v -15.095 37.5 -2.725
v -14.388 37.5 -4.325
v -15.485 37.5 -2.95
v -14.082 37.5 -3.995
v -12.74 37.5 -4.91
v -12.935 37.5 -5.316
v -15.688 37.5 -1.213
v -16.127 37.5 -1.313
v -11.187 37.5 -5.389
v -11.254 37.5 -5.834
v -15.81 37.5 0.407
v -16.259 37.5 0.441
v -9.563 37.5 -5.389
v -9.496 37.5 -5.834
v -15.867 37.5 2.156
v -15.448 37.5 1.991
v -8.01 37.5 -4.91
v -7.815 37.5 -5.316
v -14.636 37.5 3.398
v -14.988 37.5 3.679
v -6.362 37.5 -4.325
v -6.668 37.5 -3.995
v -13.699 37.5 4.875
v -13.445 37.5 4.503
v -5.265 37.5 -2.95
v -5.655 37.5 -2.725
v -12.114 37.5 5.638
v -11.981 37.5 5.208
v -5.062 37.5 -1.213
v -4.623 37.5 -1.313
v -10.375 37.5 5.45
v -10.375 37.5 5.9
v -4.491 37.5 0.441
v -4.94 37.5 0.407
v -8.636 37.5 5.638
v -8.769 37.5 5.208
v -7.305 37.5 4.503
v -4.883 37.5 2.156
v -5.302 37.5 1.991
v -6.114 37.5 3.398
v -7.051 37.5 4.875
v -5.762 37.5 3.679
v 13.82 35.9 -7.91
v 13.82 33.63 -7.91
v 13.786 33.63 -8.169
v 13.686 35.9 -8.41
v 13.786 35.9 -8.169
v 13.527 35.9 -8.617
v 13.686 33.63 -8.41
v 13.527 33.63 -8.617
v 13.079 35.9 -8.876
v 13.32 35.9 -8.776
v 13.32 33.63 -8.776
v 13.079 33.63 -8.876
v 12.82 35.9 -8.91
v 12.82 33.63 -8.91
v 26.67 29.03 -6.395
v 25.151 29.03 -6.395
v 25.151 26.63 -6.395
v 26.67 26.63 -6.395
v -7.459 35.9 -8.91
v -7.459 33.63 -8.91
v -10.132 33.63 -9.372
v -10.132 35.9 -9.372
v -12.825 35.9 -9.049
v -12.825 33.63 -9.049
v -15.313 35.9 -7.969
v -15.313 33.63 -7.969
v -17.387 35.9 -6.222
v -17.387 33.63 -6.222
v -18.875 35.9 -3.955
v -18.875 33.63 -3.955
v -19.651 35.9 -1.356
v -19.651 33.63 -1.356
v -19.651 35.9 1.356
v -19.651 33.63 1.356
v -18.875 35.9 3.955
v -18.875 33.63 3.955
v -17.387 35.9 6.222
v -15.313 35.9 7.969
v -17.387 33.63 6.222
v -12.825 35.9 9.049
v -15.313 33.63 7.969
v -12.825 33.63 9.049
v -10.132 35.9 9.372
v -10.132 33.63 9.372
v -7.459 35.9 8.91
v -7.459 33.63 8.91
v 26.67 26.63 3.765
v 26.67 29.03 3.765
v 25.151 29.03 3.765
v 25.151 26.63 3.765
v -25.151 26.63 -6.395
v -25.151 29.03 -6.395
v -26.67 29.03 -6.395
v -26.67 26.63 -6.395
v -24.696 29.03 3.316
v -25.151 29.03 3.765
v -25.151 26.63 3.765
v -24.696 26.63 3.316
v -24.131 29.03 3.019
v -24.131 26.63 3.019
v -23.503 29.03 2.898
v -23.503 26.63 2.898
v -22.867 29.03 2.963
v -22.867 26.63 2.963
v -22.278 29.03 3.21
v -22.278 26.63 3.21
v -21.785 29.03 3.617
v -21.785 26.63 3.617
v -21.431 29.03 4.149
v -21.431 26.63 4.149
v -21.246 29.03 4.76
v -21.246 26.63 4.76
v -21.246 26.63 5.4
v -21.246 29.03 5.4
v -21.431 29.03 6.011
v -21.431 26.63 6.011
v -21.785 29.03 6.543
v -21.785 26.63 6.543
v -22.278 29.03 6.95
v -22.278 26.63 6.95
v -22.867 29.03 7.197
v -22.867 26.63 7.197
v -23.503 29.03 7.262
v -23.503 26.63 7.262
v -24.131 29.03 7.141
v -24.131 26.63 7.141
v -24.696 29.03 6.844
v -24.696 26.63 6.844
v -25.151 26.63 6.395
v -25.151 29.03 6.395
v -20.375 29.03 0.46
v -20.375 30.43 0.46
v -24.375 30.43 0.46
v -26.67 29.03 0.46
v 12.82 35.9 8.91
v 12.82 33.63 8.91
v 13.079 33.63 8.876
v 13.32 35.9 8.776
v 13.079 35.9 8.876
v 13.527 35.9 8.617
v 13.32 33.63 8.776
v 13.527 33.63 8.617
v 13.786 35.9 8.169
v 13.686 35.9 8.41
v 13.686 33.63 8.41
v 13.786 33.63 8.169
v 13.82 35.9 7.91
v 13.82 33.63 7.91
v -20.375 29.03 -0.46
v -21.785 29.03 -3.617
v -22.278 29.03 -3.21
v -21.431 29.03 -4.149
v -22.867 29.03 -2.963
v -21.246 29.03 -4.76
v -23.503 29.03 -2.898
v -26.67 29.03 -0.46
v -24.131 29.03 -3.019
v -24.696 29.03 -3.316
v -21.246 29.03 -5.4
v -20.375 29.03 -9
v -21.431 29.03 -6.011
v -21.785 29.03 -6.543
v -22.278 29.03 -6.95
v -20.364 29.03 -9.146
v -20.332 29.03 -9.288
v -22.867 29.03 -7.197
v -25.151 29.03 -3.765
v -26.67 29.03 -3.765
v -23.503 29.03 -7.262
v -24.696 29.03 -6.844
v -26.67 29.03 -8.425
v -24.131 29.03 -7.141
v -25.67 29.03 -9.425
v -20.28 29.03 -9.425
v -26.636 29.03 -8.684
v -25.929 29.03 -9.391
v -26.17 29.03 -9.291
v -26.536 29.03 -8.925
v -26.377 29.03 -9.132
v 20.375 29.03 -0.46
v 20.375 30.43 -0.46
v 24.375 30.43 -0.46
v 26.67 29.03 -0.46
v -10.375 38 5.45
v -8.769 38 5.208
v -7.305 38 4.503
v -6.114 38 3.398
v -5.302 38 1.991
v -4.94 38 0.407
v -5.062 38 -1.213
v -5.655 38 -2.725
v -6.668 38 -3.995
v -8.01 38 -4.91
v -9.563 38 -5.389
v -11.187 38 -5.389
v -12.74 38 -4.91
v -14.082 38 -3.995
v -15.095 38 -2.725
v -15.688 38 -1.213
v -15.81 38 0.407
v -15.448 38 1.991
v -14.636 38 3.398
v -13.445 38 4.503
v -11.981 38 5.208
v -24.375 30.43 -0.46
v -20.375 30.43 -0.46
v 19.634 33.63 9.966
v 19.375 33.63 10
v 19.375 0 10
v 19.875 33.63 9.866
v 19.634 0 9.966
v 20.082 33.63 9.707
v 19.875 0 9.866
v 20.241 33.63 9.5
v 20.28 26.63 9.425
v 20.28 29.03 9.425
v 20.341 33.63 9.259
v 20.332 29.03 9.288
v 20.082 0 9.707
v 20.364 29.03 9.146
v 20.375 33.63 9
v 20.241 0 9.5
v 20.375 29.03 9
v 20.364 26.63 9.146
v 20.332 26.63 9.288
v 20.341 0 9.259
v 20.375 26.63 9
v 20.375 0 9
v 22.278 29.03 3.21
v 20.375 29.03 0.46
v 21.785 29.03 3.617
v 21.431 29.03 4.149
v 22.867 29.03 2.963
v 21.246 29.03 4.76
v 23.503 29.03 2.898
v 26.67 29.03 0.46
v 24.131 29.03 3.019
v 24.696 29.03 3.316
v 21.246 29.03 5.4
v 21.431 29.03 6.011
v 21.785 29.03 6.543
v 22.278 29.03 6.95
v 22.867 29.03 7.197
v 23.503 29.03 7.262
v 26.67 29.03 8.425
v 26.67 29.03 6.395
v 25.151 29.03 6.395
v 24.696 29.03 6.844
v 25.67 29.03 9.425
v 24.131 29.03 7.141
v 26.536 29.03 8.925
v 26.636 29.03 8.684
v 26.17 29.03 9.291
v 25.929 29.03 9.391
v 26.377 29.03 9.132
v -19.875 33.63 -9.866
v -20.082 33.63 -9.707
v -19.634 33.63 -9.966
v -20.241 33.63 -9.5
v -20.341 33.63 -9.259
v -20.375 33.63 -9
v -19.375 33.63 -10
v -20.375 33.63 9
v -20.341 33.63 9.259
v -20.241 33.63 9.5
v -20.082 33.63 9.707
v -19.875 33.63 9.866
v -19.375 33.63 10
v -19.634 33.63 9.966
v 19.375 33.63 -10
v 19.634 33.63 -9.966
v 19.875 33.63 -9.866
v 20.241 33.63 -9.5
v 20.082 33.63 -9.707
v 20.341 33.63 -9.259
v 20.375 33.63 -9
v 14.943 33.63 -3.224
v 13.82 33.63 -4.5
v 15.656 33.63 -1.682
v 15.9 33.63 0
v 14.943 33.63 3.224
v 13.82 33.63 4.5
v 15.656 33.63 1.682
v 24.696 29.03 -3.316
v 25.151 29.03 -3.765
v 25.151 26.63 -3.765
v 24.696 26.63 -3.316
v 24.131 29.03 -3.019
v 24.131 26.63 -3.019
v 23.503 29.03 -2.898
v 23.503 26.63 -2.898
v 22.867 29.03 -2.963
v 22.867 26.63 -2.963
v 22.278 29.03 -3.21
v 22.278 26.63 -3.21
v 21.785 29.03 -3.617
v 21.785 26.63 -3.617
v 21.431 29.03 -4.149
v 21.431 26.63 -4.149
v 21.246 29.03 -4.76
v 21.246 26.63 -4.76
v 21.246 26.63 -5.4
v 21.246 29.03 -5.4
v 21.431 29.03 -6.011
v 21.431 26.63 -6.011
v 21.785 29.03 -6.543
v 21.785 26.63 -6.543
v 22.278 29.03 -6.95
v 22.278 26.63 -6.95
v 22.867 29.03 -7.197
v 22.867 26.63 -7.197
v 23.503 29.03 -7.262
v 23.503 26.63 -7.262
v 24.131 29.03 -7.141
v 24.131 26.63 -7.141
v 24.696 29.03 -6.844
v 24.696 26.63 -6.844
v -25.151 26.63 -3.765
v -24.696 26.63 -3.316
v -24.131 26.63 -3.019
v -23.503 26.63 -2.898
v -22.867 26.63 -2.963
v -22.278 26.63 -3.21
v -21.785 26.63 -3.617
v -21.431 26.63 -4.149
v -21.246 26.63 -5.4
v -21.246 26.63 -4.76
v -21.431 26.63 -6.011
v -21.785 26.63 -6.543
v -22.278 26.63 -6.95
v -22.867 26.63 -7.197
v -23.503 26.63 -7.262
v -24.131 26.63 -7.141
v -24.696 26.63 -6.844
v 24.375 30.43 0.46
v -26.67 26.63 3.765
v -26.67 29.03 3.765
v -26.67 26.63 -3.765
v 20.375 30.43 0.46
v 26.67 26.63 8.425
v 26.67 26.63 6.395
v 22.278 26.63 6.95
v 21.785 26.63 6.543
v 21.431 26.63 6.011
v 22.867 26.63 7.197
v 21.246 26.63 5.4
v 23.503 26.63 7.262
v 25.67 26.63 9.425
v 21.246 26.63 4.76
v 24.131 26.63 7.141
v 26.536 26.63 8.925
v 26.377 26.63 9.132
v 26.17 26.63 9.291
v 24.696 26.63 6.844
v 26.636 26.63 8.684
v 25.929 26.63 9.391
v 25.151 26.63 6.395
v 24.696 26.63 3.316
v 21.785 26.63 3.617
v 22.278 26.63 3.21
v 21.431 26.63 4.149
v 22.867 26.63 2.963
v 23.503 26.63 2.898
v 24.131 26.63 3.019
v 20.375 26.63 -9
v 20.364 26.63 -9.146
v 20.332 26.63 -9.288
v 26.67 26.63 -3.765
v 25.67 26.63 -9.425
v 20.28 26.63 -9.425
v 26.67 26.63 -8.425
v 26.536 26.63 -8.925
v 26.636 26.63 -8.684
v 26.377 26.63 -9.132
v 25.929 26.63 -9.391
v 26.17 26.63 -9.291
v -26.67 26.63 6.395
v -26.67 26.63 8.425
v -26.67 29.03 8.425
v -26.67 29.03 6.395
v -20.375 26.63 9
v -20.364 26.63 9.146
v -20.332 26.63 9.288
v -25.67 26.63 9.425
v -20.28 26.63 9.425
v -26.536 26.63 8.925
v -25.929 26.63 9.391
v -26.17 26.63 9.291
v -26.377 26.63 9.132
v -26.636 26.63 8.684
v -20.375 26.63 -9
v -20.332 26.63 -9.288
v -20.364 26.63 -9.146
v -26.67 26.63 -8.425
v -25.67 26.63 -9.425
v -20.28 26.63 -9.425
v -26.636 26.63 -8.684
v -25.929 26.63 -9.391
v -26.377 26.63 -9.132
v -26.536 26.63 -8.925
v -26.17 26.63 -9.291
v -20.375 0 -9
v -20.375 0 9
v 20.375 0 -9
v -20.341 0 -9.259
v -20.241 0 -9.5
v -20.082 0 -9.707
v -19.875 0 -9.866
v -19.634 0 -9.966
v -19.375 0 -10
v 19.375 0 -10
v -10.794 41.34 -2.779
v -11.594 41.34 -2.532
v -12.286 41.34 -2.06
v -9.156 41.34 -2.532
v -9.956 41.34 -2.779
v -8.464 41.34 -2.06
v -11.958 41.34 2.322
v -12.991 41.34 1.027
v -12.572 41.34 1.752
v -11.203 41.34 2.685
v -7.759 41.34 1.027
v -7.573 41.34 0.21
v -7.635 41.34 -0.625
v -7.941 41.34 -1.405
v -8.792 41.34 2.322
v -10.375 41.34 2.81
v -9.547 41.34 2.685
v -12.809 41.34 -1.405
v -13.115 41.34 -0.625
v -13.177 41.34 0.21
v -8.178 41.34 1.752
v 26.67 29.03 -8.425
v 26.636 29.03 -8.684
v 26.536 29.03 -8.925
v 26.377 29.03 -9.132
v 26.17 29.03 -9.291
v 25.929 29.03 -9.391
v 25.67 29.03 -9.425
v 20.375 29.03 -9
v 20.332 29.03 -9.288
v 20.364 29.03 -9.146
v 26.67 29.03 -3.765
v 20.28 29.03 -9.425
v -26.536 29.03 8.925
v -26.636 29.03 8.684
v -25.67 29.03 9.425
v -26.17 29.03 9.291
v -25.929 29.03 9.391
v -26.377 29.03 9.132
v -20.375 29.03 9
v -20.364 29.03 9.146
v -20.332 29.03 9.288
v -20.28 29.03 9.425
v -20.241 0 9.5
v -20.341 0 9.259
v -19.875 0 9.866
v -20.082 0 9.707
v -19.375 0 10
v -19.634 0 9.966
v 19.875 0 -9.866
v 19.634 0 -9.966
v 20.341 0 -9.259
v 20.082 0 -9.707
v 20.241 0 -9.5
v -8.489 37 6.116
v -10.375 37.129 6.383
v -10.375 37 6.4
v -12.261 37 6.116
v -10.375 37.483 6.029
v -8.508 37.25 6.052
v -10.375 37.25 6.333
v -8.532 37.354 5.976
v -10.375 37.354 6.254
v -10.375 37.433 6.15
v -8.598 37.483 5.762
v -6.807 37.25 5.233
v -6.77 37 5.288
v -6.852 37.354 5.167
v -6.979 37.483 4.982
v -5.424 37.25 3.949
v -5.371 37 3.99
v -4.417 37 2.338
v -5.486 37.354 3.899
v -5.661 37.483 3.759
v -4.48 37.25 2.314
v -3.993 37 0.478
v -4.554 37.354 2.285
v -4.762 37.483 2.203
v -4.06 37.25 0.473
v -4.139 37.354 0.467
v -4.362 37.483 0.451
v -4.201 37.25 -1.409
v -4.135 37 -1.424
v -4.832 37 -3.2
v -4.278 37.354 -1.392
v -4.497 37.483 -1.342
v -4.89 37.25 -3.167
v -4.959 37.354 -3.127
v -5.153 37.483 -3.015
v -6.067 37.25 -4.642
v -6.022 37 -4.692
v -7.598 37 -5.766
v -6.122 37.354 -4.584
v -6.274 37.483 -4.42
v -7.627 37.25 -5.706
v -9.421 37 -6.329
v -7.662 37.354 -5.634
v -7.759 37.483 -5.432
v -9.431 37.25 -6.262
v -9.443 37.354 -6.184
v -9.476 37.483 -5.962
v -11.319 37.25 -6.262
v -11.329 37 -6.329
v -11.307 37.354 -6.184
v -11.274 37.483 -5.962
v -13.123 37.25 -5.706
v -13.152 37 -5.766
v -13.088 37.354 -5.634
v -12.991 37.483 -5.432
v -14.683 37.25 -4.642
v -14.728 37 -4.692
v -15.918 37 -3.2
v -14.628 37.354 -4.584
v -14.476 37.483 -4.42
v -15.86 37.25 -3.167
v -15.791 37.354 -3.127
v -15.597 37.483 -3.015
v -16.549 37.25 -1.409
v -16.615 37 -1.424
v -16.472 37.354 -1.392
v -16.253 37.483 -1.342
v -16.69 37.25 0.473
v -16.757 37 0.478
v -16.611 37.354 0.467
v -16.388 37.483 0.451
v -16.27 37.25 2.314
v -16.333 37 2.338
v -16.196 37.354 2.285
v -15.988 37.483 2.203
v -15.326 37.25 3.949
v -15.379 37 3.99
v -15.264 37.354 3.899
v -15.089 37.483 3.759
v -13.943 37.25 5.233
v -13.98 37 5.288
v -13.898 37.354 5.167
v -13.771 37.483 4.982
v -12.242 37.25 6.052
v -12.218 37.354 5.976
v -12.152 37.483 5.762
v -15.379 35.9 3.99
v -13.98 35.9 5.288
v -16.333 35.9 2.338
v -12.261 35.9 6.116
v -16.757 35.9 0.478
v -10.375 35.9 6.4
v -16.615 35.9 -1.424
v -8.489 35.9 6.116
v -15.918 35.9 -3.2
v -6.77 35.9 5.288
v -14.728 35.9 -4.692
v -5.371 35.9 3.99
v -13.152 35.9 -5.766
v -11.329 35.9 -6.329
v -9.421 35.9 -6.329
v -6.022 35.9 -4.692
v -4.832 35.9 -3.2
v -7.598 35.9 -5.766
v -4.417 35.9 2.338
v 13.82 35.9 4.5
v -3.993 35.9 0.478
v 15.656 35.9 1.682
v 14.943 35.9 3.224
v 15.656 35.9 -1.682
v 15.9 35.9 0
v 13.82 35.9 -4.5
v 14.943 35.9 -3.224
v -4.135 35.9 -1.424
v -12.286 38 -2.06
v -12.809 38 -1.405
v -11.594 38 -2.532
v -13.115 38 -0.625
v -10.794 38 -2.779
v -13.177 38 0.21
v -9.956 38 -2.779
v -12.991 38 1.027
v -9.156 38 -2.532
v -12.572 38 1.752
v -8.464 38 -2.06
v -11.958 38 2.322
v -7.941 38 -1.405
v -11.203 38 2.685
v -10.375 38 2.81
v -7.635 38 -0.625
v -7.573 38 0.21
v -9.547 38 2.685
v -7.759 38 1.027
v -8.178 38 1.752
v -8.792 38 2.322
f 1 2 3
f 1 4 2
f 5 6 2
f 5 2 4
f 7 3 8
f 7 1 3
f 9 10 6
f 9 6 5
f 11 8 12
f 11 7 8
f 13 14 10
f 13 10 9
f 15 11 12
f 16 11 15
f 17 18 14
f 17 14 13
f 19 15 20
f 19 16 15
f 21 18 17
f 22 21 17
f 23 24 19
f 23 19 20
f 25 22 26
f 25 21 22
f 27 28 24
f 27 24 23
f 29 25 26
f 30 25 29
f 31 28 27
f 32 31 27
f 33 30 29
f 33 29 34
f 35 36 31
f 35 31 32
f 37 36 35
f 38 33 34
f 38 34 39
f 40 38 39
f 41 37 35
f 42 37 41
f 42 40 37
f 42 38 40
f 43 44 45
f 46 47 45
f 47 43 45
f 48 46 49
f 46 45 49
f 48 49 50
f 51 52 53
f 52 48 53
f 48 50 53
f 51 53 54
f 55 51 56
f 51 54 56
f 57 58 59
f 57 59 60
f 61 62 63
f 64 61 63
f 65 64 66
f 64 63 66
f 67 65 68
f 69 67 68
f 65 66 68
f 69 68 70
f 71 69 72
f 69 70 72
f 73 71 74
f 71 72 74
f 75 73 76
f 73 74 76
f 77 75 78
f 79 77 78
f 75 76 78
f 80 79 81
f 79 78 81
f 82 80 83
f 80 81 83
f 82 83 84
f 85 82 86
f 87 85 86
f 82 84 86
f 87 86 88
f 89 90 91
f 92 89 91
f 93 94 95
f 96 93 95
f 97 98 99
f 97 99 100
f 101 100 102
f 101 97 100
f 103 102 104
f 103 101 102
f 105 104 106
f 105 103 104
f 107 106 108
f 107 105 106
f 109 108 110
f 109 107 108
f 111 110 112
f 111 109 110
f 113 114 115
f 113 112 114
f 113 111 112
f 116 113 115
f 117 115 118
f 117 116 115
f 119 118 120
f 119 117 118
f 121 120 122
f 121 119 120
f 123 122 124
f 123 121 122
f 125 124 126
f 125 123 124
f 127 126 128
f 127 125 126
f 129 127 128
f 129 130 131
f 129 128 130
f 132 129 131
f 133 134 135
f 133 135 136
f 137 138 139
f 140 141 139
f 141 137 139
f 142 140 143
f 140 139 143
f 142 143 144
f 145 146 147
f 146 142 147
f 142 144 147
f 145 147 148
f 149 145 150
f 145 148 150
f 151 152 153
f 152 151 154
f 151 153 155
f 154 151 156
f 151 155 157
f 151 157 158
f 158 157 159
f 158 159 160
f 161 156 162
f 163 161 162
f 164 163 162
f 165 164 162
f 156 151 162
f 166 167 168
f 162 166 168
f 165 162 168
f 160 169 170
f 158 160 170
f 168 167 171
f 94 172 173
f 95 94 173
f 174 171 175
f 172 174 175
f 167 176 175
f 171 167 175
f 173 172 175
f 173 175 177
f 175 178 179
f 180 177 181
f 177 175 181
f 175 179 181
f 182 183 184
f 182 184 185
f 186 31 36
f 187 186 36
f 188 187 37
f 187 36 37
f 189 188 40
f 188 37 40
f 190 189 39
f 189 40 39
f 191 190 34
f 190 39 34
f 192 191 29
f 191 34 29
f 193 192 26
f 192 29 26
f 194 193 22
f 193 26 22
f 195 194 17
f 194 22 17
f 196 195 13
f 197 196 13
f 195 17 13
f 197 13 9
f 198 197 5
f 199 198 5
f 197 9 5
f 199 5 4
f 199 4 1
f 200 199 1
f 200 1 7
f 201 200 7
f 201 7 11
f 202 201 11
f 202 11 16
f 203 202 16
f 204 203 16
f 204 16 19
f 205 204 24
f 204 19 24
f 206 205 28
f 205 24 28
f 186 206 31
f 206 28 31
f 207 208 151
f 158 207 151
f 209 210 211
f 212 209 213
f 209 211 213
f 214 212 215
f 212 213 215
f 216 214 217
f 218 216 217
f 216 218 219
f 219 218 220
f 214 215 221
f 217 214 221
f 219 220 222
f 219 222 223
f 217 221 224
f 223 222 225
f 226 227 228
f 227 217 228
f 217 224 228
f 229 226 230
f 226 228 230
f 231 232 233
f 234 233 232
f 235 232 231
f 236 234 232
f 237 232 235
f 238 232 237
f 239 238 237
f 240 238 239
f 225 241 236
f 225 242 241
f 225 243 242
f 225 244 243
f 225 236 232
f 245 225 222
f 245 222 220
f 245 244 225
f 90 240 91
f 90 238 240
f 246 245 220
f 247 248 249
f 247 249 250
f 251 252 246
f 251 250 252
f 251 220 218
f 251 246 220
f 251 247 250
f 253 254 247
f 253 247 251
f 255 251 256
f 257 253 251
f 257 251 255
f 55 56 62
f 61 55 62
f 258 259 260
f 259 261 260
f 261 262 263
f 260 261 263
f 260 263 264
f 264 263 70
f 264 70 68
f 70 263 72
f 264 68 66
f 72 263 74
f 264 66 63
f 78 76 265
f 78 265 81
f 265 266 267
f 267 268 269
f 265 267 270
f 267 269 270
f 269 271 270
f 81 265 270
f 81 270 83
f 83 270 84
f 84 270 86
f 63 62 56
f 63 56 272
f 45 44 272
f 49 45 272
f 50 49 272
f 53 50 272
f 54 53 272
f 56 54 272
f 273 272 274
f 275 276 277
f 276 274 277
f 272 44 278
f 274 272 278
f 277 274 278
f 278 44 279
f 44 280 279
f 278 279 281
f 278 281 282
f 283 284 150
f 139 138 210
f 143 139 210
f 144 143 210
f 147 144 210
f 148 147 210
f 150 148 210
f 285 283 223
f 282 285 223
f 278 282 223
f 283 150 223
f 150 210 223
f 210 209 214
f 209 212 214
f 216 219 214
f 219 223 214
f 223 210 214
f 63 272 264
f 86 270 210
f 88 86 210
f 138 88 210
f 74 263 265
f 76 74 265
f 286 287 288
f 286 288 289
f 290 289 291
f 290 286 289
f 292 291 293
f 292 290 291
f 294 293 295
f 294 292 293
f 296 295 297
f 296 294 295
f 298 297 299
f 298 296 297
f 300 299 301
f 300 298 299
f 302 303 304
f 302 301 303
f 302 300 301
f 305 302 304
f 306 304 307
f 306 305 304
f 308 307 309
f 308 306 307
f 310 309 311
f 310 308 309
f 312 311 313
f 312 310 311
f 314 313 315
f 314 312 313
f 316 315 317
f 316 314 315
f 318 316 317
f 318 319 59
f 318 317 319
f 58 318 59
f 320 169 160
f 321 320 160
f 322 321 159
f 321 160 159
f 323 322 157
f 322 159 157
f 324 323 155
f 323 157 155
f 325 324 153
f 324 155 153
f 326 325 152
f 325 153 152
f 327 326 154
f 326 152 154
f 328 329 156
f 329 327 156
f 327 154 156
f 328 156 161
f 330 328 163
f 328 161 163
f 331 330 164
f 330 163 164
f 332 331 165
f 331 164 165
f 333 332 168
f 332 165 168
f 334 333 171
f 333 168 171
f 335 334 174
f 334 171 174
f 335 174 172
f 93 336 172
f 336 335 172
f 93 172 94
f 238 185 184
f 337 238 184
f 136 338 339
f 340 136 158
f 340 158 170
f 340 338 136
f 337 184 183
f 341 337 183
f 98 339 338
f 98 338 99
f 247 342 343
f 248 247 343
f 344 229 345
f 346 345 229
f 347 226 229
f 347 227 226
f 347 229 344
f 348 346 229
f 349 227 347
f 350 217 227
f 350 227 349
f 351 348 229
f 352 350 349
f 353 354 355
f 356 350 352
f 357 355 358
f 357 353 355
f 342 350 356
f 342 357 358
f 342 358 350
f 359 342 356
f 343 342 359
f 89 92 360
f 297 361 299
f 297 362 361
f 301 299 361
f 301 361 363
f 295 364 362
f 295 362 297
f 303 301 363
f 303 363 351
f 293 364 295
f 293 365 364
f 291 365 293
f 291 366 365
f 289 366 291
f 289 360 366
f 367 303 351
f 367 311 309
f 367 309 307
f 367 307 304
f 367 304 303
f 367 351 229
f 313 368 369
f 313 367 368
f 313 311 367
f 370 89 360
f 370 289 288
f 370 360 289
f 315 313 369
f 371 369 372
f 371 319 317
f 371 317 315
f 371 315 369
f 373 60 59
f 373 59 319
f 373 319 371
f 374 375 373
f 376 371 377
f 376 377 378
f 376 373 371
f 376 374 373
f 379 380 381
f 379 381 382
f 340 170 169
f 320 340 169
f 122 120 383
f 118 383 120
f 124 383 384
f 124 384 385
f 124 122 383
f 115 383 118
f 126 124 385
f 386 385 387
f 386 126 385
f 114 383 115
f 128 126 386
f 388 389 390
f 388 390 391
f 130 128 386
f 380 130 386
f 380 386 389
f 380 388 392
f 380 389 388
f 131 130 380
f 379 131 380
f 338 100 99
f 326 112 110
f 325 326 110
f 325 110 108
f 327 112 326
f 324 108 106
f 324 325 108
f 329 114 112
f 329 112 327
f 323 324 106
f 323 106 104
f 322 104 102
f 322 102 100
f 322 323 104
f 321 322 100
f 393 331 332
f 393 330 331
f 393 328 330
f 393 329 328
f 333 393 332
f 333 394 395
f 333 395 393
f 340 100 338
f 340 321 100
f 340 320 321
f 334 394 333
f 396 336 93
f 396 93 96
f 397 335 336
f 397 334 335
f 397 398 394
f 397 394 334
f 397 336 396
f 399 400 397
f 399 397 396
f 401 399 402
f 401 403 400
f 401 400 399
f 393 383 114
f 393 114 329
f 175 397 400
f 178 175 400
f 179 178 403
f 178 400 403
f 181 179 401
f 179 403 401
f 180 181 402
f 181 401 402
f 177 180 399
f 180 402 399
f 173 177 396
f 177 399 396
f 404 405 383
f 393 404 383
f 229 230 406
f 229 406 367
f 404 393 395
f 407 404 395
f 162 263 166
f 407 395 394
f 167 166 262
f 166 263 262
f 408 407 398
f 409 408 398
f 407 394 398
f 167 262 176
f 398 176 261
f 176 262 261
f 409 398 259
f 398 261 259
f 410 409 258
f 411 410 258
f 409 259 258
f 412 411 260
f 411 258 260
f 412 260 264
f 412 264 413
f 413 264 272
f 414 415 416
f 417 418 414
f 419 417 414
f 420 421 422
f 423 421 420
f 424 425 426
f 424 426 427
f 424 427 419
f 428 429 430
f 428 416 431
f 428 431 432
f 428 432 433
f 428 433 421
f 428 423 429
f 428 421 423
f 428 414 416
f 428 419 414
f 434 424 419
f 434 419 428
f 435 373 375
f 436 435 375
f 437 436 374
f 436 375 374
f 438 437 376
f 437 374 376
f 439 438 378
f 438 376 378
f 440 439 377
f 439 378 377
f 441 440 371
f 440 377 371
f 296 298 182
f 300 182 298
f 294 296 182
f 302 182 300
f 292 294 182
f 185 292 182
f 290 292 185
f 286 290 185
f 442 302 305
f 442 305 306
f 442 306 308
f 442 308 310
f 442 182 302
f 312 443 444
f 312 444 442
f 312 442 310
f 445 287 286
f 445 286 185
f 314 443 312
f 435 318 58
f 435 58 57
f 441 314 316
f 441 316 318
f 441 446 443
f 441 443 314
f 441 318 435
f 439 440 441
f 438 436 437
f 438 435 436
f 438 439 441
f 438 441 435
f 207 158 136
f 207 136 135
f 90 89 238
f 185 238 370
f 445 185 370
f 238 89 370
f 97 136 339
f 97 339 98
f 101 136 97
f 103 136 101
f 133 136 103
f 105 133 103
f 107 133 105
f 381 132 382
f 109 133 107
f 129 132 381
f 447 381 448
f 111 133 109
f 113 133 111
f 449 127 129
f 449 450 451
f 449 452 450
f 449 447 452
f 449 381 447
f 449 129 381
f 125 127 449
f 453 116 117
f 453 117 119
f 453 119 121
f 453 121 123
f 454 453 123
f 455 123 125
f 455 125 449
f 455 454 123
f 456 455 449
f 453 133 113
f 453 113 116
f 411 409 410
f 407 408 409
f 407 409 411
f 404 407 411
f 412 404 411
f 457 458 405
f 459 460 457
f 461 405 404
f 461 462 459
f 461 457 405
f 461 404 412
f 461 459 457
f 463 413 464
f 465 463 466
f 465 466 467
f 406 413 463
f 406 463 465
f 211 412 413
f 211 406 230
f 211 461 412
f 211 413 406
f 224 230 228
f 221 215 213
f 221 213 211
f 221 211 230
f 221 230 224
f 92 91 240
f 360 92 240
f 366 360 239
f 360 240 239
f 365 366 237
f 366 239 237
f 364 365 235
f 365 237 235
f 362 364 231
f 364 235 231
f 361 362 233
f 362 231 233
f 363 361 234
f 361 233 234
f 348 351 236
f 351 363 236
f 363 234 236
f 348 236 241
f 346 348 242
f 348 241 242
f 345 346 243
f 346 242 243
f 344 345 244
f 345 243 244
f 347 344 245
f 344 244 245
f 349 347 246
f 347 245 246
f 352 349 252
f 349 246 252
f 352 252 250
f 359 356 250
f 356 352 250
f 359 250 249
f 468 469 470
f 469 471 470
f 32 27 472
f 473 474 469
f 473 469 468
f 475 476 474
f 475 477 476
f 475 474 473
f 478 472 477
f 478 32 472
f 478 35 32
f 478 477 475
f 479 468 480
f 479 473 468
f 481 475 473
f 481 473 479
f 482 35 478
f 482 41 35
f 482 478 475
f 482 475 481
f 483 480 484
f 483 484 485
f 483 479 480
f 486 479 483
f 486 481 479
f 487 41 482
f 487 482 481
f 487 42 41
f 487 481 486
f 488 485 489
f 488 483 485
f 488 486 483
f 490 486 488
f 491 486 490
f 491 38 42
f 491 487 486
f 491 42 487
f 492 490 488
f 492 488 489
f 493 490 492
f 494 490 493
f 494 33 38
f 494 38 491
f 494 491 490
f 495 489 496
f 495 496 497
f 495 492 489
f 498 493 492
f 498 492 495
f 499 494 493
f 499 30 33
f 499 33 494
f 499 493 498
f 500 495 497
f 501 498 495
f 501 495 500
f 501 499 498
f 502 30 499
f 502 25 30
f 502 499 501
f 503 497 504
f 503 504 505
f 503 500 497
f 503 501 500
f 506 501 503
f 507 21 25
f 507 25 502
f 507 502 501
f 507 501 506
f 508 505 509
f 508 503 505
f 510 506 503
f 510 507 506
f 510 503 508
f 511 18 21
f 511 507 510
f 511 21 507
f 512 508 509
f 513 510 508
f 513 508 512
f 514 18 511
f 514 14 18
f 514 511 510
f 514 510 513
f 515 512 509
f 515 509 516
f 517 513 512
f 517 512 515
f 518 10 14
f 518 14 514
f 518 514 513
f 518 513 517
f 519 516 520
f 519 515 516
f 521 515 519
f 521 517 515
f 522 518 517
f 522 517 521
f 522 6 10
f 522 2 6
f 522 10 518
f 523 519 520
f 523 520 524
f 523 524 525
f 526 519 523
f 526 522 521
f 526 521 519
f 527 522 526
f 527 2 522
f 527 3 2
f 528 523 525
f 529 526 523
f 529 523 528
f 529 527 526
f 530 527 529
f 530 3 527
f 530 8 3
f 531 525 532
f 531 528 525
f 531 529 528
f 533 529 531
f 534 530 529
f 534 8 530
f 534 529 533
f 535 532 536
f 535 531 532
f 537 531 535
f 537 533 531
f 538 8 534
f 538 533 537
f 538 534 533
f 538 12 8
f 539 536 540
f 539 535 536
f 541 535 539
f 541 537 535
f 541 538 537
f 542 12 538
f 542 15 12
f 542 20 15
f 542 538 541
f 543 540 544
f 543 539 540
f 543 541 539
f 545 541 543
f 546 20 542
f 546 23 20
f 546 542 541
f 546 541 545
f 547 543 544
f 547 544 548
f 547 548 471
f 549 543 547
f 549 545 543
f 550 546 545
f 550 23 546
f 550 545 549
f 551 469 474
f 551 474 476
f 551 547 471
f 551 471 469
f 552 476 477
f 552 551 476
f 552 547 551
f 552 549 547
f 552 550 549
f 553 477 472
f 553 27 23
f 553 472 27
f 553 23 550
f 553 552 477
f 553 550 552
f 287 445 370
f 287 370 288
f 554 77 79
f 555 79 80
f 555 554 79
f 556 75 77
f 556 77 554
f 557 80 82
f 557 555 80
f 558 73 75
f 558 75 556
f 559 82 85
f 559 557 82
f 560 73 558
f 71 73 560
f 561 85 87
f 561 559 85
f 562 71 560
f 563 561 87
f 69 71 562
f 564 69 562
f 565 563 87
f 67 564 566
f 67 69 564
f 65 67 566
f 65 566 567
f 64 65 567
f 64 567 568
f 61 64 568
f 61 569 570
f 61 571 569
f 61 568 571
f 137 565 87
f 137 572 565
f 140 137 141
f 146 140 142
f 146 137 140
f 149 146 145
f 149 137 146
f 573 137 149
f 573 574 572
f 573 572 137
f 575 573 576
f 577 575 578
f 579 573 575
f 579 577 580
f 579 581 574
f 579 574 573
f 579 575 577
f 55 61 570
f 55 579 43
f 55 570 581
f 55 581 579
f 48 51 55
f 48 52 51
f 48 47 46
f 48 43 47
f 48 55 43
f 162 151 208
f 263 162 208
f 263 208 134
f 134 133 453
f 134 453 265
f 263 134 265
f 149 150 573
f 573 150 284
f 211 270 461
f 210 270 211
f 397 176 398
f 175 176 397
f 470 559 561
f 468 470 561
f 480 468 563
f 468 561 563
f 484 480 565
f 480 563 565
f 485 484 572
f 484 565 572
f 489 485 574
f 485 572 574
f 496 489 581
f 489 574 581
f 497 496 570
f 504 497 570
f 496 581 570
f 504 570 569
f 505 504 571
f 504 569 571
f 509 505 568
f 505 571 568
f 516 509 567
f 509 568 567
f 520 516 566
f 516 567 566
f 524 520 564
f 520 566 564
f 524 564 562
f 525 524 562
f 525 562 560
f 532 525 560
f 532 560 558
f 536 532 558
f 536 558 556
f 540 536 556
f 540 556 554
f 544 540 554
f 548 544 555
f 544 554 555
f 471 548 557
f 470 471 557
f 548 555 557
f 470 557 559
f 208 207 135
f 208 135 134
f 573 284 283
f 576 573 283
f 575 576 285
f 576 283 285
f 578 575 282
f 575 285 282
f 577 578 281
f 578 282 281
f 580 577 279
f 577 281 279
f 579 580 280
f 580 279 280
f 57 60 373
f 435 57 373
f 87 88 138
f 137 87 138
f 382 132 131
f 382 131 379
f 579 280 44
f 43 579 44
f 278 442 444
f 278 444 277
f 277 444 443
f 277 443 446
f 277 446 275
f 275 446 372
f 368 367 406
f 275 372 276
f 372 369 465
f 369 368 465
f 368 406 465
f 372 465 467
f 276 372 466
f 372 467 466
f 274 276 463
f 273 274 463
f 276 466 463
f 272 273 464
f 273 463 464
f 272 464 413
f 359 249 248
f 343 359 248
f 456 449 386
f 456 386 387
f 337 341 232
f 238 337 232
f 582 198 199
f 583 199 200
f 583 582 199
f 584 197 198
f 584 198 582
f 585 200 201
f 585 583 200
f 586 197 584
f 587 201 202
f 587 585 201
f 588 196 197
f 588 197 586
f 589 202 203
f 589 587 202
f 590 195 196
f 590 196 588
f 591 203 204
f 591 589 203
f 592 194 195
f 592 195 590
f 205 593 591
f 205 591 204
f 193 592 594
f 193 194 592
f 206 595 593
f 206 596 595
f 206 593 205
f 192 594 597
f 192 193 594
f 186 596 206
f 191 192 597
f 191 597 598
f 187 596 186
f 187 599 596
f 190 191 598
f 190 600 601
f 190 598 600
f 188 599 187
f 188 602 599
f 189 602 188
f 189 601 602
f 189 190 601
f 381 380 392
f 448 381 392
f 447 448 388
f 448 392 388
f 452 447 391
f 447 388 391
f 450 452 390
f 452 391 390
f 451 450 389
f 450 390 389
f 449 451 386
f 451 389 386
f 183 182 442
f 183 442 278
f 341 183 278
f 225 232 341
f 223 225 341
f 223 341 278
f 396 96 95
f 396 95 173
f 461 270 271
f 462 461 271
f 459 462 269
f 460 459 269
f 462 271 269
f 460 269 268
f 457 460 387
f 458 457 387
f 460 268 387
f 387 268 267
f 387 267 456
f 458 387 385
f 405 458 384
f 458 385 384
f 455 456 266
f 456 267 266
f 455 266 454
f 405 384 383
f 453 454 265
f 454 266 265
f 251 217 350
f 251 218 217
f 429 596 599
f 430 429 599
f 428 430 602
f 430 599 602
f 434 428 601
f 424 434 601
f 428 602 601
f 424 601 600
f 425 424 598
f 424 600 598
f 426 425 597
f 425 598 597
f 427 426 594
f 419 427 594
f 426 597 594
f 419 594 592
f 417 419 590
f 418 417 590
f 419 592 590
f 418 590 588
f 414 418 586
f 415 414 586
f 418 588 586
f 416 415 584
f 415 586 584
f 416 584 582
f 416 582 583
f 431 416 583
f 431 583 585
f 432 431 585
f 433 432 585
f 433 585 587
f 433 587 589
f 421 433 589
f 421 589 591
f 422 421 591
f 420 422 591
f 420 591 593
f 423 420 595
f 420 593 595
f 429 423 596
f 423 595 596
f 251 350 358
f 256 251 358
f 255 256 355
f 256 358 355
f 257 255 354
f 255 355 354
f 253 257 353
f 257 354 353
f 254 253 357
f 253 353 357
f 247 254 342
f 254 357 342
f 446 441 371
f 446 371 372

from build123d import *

# Parameters (mm, degrees)
SKETCH1_W            = 40.75
SKETCH1_H            = 33.63
BOSS_EXTRUDE1_DEPTH  = 10
BOSS_EXTRUDE2_DEPTH  = 2.27
SKETCH3_R            = 6.4
BOSS_EXTRUDE3_DEPTH  = 1.6
SKETCH4_R            = 5.45
BOSS_EXTRUDE4_DEPTH  = 0.5
SKETCH5_R            = 2.81
BOSS_EXTRUDE5_DEPTH  = 3.34
BOSS_EXTRUDE6_START  = -7
SKETCH6_W            = 6.295
SKETCH6_H            = 18.85
BOSS_EXTRUDE6_DEPTH  = 2.4
RIB1_START           = -0.46
RIB1_DEPTH           = 0.92
CUT_EXTRUDE2_REACH   = 42.67
MIRROR1_COPY_1_REACH = 42.67
FILLET2_R            = 1
FILLET3_R            = 0.5


# Read off the part's stored shape, not the designer's step: Rib1
with BuildPart() as part:
    # Sketch1 → Boss-Extrude1 (new, symmetric)
    with BuildSketch(Plane.XY):
        with Locations((0, 16.815)):
            Rectangle(SKETCH1_W, SKETCH1_H)
    extrude(amount=BOSS_EXTRUDE1_DEPTH, both=True)

    # Sketch2 → Boss-Extrude2 (add)
    with BuildSketch(Plane(origin=(0, 33.63, 0), x_dir=(1, 0, 0), z_dir=(0, 1, 0))):
        with BuildLine():
            Line((-7.459091051, -8.91), (13.82, -8.91))
            Line((13.82, -8.91), (13.82, -4.5))
            ThreePointArc((13.82, -4.5), (15.9, 0), (13.82, 4.5))
            Line((13.82, 4.5), (13.82, 8.91))
            Line((13.82, 8.91), (-7.459091051, 8.91))
            ThreePointArc((-7.459091051, 8.91), (-19.75, 0), (-7.459091051, -8.91))
        make_face()
    extrude(amount=BOSS_EXTRUDE2_DEPTH)

    # Sketch3 → Boss-Extrude3 (add)
    with BuildSketch(Plane(origin=(0, 35.9, 0), x_dir=(1, 0, 0), z_dir=(0, 1, 0))):
        with Locations(Location((-10.375, 0, 0), (0, 0, 270))):
            Circle(SKETCH3_R)
    extrude(amount=BOSS_EXTRUDE3_DEPTH)

    # Sketch4 → Boss-Extrude4 (add)
    with BuildSketch(Plane(origin=(0, 37.5, 0), x_dir=(1, 0, 0), z_dir=(0, 1, 0))):
        with Locations(Location((-10.375, 0, 0), (0, 0, 270))):
            Circle(SKETCH4_R)
    extrude(amount=BOSS_EXTRUDE4_DEPTH)

    # Sketch5 → Boss-Extrude5 (add)
    with BuildSketch(Plane(origin=(0, 38, 0), x_dir=(1, 0, 0), z_dir=(0, 1, 0))):
        with Locations(Location((-10.375, 0, 0), (0, 0, 270))):
            Circle(SKETCH5_R)
    extrude(amount=BOSS_EXTRUDE5_DEPTH)

    # Sketch6 → Boss-Extrude6 (add)
    with BuildSketch(Plane(origin=(0, 33.63, 0), x_dir=(1, 0, 0), z_dir=(0, 1, 0)).offset(BOSS_EXTRUDE6_START)):
        with Locations((23.5225, 0)):
            Rectangle(SKETCH6_W, SKETCH6_H)
    boss_extrude6 = extrude(amount=BOSS_EXTRUDE6_DEPTH)

    # Rib1 outline → Rib1 (add)
    with BuildSketch(Plane.XY.offset(RIB1_START)):
        Polygon((24.375, 30.43), (20.375, 30.43), (20.375, 29.03), (26.67, 29.03), align=None)
    rib1 = extrude(amount=RIB1_DEPTH)

    # Sketch10 → Cut-Extrude2 (cut, up to next)
    with BuildSketch(Plane(origin=(0, 29.03, 0), x_dir=(1, 0, 0), z_dir=(0, 1, 0)), mode=Mode.PRIVATE) as cut_extrude2_sk1:
        with BuildLine():
            Line((25.151241486, 6.395), (26.67, 6.395))
            Line((26.67, 6.395), (26.67, 3.765))
            Line((26.67, 3.765), (25.151241486, 3.765))
            ThreePointArc((25.151241486, 3.765), (21.2226, 5.08), (25.151241486, 6.395))
        make_face()
    cut_extrude2_tool1 = extrude(cut_extrude2_sk1.sketch, amount=-CUT_EXTRUDE2_REACH, mode=Mode.PRIVATE) & part.part
    cut_extrude2 = cut_extrude2_tool1.solids().sort_by_distance((23.873275, 29.03, -5.08))[0]
    add(cut_extrude2, mode=Mode.SUBTRACT)

    # Mirror2: Cut-Extrude2 across plane
    add(cut_extrude2.mirror(Plane.XY), mode=Mode.SUBTRACT)

    # Mirror1: Boss-Extrude6, Rib1, Cut-Extrude2 across plane
    add(boss_extrude6.mirror(Plane(origin=(0, 0, 0), x_dir=(0, 0, 1), z_dir=(1, 0, 0))))
    add(rib1.mirror(Plane(origin=(0, 0, 0), x_dir=(0, 0, 1), z_dir=(1, 0, 0))))
    add(cut_extrude2.mirror(Plane(origin=(0, 0, 0), x_dir=(0, 0, 1), z_dir=(1, 0, 0))), mode=Mode.SUBTRACT)

    # Mirror1 copy 1 sketch → Mirror1 copy 1 (cut, up to next)
    with BuildSketch(Plane(origin=(0, 29.03, 0), x_dir=(-1, 0, 0), z_dir=(0, 1, 0)), mode=Mode.PRIVATE) as mirror1_copy_1_sk1:
        with BuildLine():
            Line((25.151241486, 6.395), (26.67, 6.395))
            Line((26.67, 6.395), (26.67, 3.765))
            Line((26.67, 3.765), (25.151241486, 3.765))
            ThreePointArc((25.151241486, 3.765), (21.2226, 5.08), (25.151241486, 6.395))
        make_face()
    mirror1_copy_1_tool1 = extrude(mirror1_copy_1_sk1.sketch, amount=-MIRROR1_COPY_1_REACH, mode=Mode.PRIVATE) & part.part
    add(mirror1_copy_1_tool1.solids().sort_by_distance((-23.873275, 29.03, 5.08))[0], mode=Mode.SUBTRACT)

    # Fillet2
    # the kernel refuses this fillet: 1 mm, written as the material it takes off along each edge
    with BuildSketch(Plane(origin=(13.82, 33.63, -8.91), x_dir=(0, 0, 1), z_dir=(0, 1, 0)), Plane(origin=(13.82, 33.63, 8.91), x_dir=(-1, 0, 0), z_dir=(0, 1, 0))) as fillet2_piece_1:
        with BuildLine():
            CenterArc((FILLET2_R, -FILLET2_R), FILLET2_R, 90, 90)
            Line((0, -FILLET2_R), (0, 0))
            Line((0, 0), (FILLET2_R, 0))
        make_face()
    extrude(amount=4.77, mode=Mode.SUBTRACT)
    with BuildSketch(Plane(origin=(26.67, 24.13, 9.425), x_dir=(-1, 0, 0), z_dir=(0, 1, 0)), Plane(origin=(-26.67, 24.13, -9.425), x_dir=(1, 0, 0), z_dir=(0, 1, 0))) as fillet2_piece_2:
        with BuildLine():
            CenterArc((FILLET2_R, -FILLET2_R), FILLET2_R, 90, 90)
            Line((0, -FILLET2_R), (0, 0))
            Line((0, 0), (FILLET2_R, 0))
        make_face()
    extrude(amount=7.4, mode=Mode.SUBTRACT)
    with BuildSketch(Plane(origin=(26.67, 24.13, -9.425), x_dir=(-1, 0, 0), z_dir=(0, 1, 0)), Plane(origin=(-26.67, 24.13, 9.425), x_dir=(1, 0, 0), z_dir=(0, 1, 0))) as fillet2_piece_3:
        with BuildLine():
            CenterArc((FILLET2_R, FILLET2_R), FILLET2_R, 180, 90)
            Line((0, FILLET2_R), (0, 0))
            Line((0, 0), (FILLET2_R, 0))
        make_face()
    extrude(amount=7.4, mode=Mode.SUBTRACT)
    with BuildSketch(Plane(origin=(-20.375, 36.13, -10), x_dir=(1, 0, 0), z_dir=(0, -1, 0))) as fillet2_piece_4_section:
        with BuildLine():
            CenterArc((FILLET2_R, FILLET2_R), FILLET2_R, 180, 90)
            Line((0, FILLET2_R), (0, 0))
            Line((0, 0), (FILLET2_R, 0))
        make_face()
    fillet2_piece_4 = extrude(amount=38.63, mode=Mode.PRIVATE)
    fillet2_piece_4 = split(fillet2_piece_4, bisect_by=Plane(origin=(-20.12881047, 29.03, -9.819650702), z_dir=(0, 1, 0)), keep=Keep.TOP, mode=Mode.PRIVATE)
    fillet2_piece_4 = split(fillet2_piece_4, bisect_by=Plane(origin=(-20.12881047, 32.58, -9.425), z_dir=(0, 0, -1)), keep=Keep.TOP, mode=Mode.PRIVATE)
    add(fillet2_piece_4, mode=Mode.SUBTRACT)
    with BuildSketch(Plane(origin=(-20.375, 36.13, -10), x_dir=(1, 0, 0), z_dir=(0, -1, 0))) as fillet2_piece_5_section:
        with BuildLine():
            CenterArc((FILLET2_R, FILLET2_R), FILLET2_R, 180, 90)
            Line((0, FILLET2_R), (0, 0))
            Line((0, 0), (FILLET2_R, 0))
        make_face()
    fillet2_piece_5 = extrude(amount=38.63, mode=Mode.PRIVATE)
    fillet2_piece_5 = split(fillet2_piece_5, bisect_by=Plane(origin=(-20.361790059, 29.03, -9.277693036), z_dir=(0, 1, 0)), keep=Keep.TOP, mode=Mode.PRIVATE)
    fillet2_piece_5 = split(fillet2_piece_5, bisect_by=Plane(origin=(-20.361790059, 32.58, -9.425), z_dir=(0, 0, 1)), keep=Keep.TOP, mode=Mode.PRIVATE)
    add(fillet2_piece_5, mode=Mode.SUBTRACT)
    with BuildSketch(Plane(origin=(-20.375, 36.13, -10), x_dir=(1, 0, 0), z_dir=(0, -1, 0))) as fillet2_piece_6_section:
        with BuildLine():
            CenterArc((FILLET2_R, FILLET2_R), FILLET2_R, 180, 90)
            Line((0, FILLET2_R), (0, 0))
            Line((0, 0), (FILLET2_R, 0))
        make_face()
    fillet2_piece_6 = extrude(amount=38.63, mode=Mode.PRIVATE)
    fillet2_piece_6 = split(fillet2_piece_6, bisect_by=Plane(origin=(-20.12881047, 29.03, -9.819650702), z_dir=(0, -1, 0)), keep=Keep.TOP, mode=Mode.PRIVATE)
    fillet2_piece_6 = split(fillet2_piece_6, bisect_by=Plane(origin=(-20.12881047, 27.83, -9.425), z_dir=(0, 0, -1)), keep=Keep.TOP, mode=Mode.PRIVATE)
    fillet2_piece_6 = split(fillet2_piece_6, bisect_by=Plane(origin=(-20.12881047, 26.63, -9.819650702), z_dir=(0, 1, 0)), keep=Keep.TOP, mode=Mode.PRIVATE)
    add(fillet2_piece_6, mode=Mode.SUBTRACT)
    with BuildSketch(Plane(origin=(-20.375, 36.13, -10), x_dir=(1, 0, 0), z_dir=(0, -1, 0))) as fillet2_piece_7_section:
        with BuildLine():
            CenterArc((FILLET2_R, FILLET2_R), FILLET2_R, 180, 90)
            Line((0, FILLET2_R), (0, 0))
            Line((0, 0), (FILLET2_R, 0))
        make_face()
    fillet2_piece_7 = extrude(amount=38.63, mode=Mode.PRIVATE)
    fillet2_piece_7 = split(fillet2_piece_7, bisect_by=Plane(origin=(-20.12881047, 12.065, -9.425), z_dir=(0, 0, -1)), keep=Keep.TOP, mode=Mode.PRIVATE)
    fillet2_piece_7 = split(fillet2_piece_7, bisect_by=Plane(origin=(-20.12881047, 26.63, -9.819650702), z_dir=(0, -1, 0)), keep=Keep.TOP, mode=Mode.PRIVATE)
    add(fillet2_piece_7, mode=Mode.SUBTRACT)
    with BuildSketch(Plane(origin=(-20.375, 36.13, -10), x_dir=(1, 0, 0), z_dir=(0, -1, 0))) as fillet2_piece_8_section:
        with BuildLine():
            CenterArc((FILLET2_R, FILLET2_R), FILLET2_R, 180, 90)
            Line((0, FILLET2_R), (0, 0))
            Line((0, 0), (FILLET2_R, 0))
        make_face()
    fillet2_piece_8 = extrude(amount=38.63, mode=Mode.PRIVATE)
    fillet2_piece_8 = split(fillet2_piece_8, bisect_by=Plane(origin=(-20.361790059, 12.065, -9.425), z_dir=(0, 0, 1)), keep=Keep.TOP, mode=Mode.PRIVATE)
    fillet2_piece_8 = split(fillet2_piece_8, bisect_by=Plane(origin=(-20.361790059, 26.63, -9.277693036), z_dir=(0, -1, 0)), keep=Keep.TOP, mode=Mode.PRIVATE)
    add(fillet2_piece_8, mode=Mode.SUBTRACT)
    with BuildSketch(Plane(origin=(20.375, -2.5, -10), x_dir=(-1, 0, 0), z_dir=(0, 1, 0))) as fillet2_piece_9_section:
        with BuildLine():
            CenterArc((FILLET2_R, FILLET2_R), FILLET2_R, 180, 90)
            Line((0, FILLET2_R), (0, 0))
            Line((0, 0), (FILLET2_R, 0))
        make_face()
    fillet2_piece_9 = extrude(amount=38.63, mode=Mode.PRIVATE)
    fillet2_piece_9 = split(fillet2_piece_9, bisect_by=Plane(origin=(20.12881047, 12.065, -9.425), z_dir=(0, 0, -1)), keep=Keep.TOP, mode=Mode.PRIVATE)
    fillet2_piece_9 = split(fillet2_piece_9, bisect_by=Plane(origin=(20.12881047, 26.63, -9.819650702), z_dir=(0, -1, 0)), keep=Keep.TOP, mode=Mode.PRIVATE)
    add(fillet2_piece_9, mode=Mode.SUBTRACT)
    with BuildSketch(Plane(origin=(20.375, -2.5, -10), x_dir=(-1, 0, 0), z_dir=(0, 1, 0))) as fillet2_piece_10_section:
        with BuildLine():
            CenterArc((FILLET2_R, FILLET2_R), FILLET2_R, 180, 90)
            Line((0, FILLET2_R), (0, 0))
            Line((0, 0), (FILLET2_R, 0))
        make_face()
    fillet2_piece_10 = extrude(amount=38.63, mode=Mode.PRIVATE)
    fillet2_piece_10 = split(fillet2_piece_10, bisect_by=Plane(origin=(20.361790059, 12.065, -9.425), z_dir=(0, 0, 1)), keep=Keep.TOP, mode=Mode.PRIVATE)
    fillet2_piece_10 = split(fillet2_piece_10, bisect_by=Plane(origin=(20.361790059, 26.63, -9.277693036), z_dir=(0, -1, 0)), keep=Keep.TOP, mode=Mode.PRIVATE)
    add(fillet2_piece_10, mode=Mode.SUBTRACT)
    with BuildSketch(Plane(origin=(20.375, -2.5, -10), x_dir=(-1, 0, 0), z_dir=(0, 1, 0))) as fillet2_piece_11_section:
        with BuildLine():
            CenterArc((FILLET2_R, FILLET2_R), FILLET2_R, 180, 90)
            Line((0, FILLET2_R), (0, 0))
            Line((0, 0), (FILLET2_R, 0))
        make_face()
    fillet2_piece_11 = extrude(amount=38.63, mode=Mode.PRIVATE)
    fillet2_piece_11 = split(fillet2_piece_11, bisect_by=Plane(origin=(20.12881047, 27.83, -9.425), z_dir=(0, 0, -1)), keep=Keep.TOP, mode=Mode.PRIVATE)
    fillet2_piece_11 = split(fillet2_piece_11, bisect_by=Plane(origin=(20.12881047, 29.03, -9.819650702), z_dir=(0, -1, 0)), keep=Keep.TOP, mode=Mode.PRIVATE)
    fillet2_piece_11 = split(fillet2_piece_11, bisect_by=Plane(origin=(20.12881047, 26.63, -9.819650702), z_dir=(0, 1, 0)), keep=Keep.TOP, mode=Mode.PRIVATE)
    add(fillet2_piece_11, mode=Mode.SUBTRACT)
    with BuildSketch(Plane(origin=(20.375, -2.5, -10), x_dir=(-1, 0, 0), z_dir=(0, 1, 0))) as fillet2_piece_12_section:
        with BuildLine():
            CenterArc((FILLET2_R, FILLET2_R), FILLET2_R, 180, 90)
            Line((0, FILLET2_R), (0, 0))
            Line((0, 0), (FILLET2_R, 0))
        make_face()
    fillet2_piece_12 = extrude(amount=38.63, mode=Mode.PRIVATE)
    fillet2_piece_12 = split(fillet2_piece_12, bisect_by=Plane(origin=(20.12881047, 32.58, -9.425), z_dir=(0, 0, -1)), keep=Keep.TOP, mode=Mode.PRIVATE)
    fillet2_piece_12 = split(fillet2_piece_12, bisect_by=Plane(origin=(20.12881047, 29.03, -9.819650702), z_dir=(0, 1, 0)), keep=Keep.TOP, mode=Mode.PRIVATE)
    add(fillet2_piece_12, mode=Mode.SUBTRACT)
    with BuildSketch(Plane(origin=(20.375, -2.5, -10), x_dir=(-1, 0, 0), z_dir=(0, 1, 0))) as fillet2_piece_13_section:
        with BuildLine():
            CenterArc((FILLET2_R, FILLET2_R), FILLET2_R, 180, 90)
            Line((0, FILLET2_R), (0, 0))
            Line((0, 0), (FILLET2_R, 0))
        make_face()
    fillet2_piece_13 = extrude(amount=38.63, mode=Mode.PRIVATE)
    fillet2_piece_13 = split(fillet2_piece_13, bisect_by=Plane(origin=(20.361790059, 32.58, -9.425), z_dir=(0, 0, 1)), keep=Keep.TOP, mode=Mode.PRIVATE)
    fillet2_piece_13 = split(fillet2_piece_13, bisect_by=Plane(origin=(20.361790059, 29.03, -9.277693036), z_dir=(0, 1, 0)), keep=Keep.TOP, mode=Mode.PRIVATE)
    add(fillet2_piece_13, mode=Mode.SUBTRACT)
    with BuildSketch(Plane(origin=(20.375, -2.5, 10), x_dir=(0, 0, -1), z_dir=(0, 1, 0))) as fillet2_piece_14_section:
        with BuildLine():
            CenterArc((FILLET2_R, FILLET2_R), FILLET2_R, 180, 90)
            Line((0, FILLET2_R), (0, 0))
            Line((0, 0), (FILLET2_R, 0))
        make_face()
    fillet2_piece_14 = extrude(amount=38.63, mode=Mode.PRIVATE)
    fillet2_piece_14 = split(fillet2_piece_14, bisect_by=Plane(origin=(20.361790059, 12.065, 9.425), z_dir=(0, 0, -1)), keep=Keep.TOP, mode=Mode.PRIVATE)
    fillet2_piece_14 = split(fillet2_piece_14, bisect_by=Plane(origin=(20.361790059, 26.63, 9.277693036), z_dir=(0, -1, 0)), keep=Keep.TOP, mode=Mode.PRIVATE)
    add(fillet2_piece_14, mode=Mode.SUBTRACT)
    with BuildSketch(Plane(origin=(20.375, -2.5, 10), x_dir=(0, 0, -1), z_dir=(0, 1, 0))) as fillet2_piece_15_section:
        with BuildLine():
            CenterArc((FILLET2_R, FILLET2_R), FILLET2_R, 180, 90)
            Line((0, FILLET2_R), (0, 0))
            Line((0, 0), (FILLET2_R, 0))
        make_face()
    fillet2_piece_15 = extrude(amount=38.63, mode=Mode.PRIVATE)
    fillet2_piece_15 = split(fillet2_piece_15, bisect_by=Plane(origin=(20.12881047, 12.065, 9.425), z_dir=(0, 0, 1)), keep=Keep.TOP, mode=Mode.PRIVATE)
    fillet2_piece_15 = split(fillet2_piece_15, bisect_by=Plane(origin=(20.12881047, 26.63, 9.819650702), z_dir=(0, -1, 0)), keep=Keep.TOP, mode=Mode.PRIVATE)
    add(fillet2_piece_15, mode=Mode.SUBTRACT)
    with BuildSketch(Plane(origin=(20.375, -2.5, 10), x_dir=(0, 0, -1), z_dir=(0, 1, 0))) as fillet2_piece_16_section:
        with BuildLine():
            CenterArc((FILLET2_R, FILLET2_R), FILLET2_R, 180, 90)
            Line((0, FILLET2_R), (0, 0))
            Line((0, 0), (FILLET2_R, 0))
        make_face()
    fillet2_piece_16 = extrude(amount=38.63, mode=Mode.PRIVATE)
    fillet2_piece_16 = split(fillet2_piece_16, bisect_by=Plane(origin=(20.12881047, 29.03, 9.819650702), z_dir=(0, -1, 0)), keep=Keep.TOP, mode=Mode.PRIVATE)
    fillet2_piece_16 = split(fillet2_piece_16, bisect_by=Plane(origin=(20.12881047, 27.83, 9.425), z_dir=(0, 0, 1)), keep=Keep.TOP, mode=Mode.PRIVATE)
    fillet2_piece_16 = split(fillet2_piece_16, bisect_by=Plane(origin=(20.12881047, 26.63, 9.819650702), z_dir=(0, 1, 0)), keep=Keep.TOP, mode=Mode.PRIVATE)
    add(fillet2_piece_16, mode=Mode.SUBTRACT)
    with BuildSketch(Plane(origin=(20.375, -2.5, 10), x_dir=(0, 0, -1), z_dir=(0, 1, 0))) as fillet2_piece_17_section:
        with BuildLine():
            CenterArc((FILLET2_R, FILLET2_R), FILLET2_R, 180, 90)
            Line((0, FILLET2_R), (0, 0))
            Line((0, 0), (FILLET2_R, 0))
        make_face()
    fillet2_piece_17 = extrude(amount=38.63, mode=Mode.PRIVATE)
    fillet2_piece_17 = split(fillet2_piece_17, bisect_by=Plane(origin=(20.361790059, 29.03, 9.277693036), z_dir=(0, 1, 0)), keep=Keep.TOP, mode=Mode.PRIVATE)
    fillet2_piece_17 = split(fillet2_piece_17, bisect_by=Plane(origin=(20.361790059, 32.58, 9.425), z_dir=(0, 0, -1)), keep=Keep.TOP, mode=Mode.PRIVATE)
    add(fillet2_piece_17, mode=Mode.SUBTRACT)
    with BuildSketch(Plane(origin=(20.375, -2.5, 10), x_dir=(0, 0, -1), z_dir=(0, 1, 0))) as fillet2_piece_18_section:
        with BuildLine():
            CenterArc((FILLET2_R, FILLET2_R), FILLET2_R, 180, 90)
            Line((0, FILLET2_R), (0, 0))
            Line((0, 0), (FILLET2_R, 0))
        make_face()
    fillet2_piece_18 = extrude(amount=38.63, mode=Mode.PRIVATE)
    fillet2_piece_18 = split(fillet2_piece_18, bisect_by=Plane(origin=(20.12881047, 29.03, 9.819650702), z_dir=(0, 1, 0)), keep=Keep.TOP, mode=Mode.PRIVATE)
    fillet2_piece_18 = split(fillet2_piece_18, bisect_by=Plane(origin=(20.12881047, 32.58, 9.425), z_dir=(0, 0, 1)), keep=Keep.TOP, mode=Mode.PRIVATE)
    add(fillet2_piece_18, mode=Mode.SUBTRACT)
    with BuildSketch(Plane(origin=(-20.375, 36.13, 10), x_dir=(1, 0, 0), z_dir=(0, -1, 0))) as fillet2_piece_19_section:
        with BuildLine():
            CenterArc((FILLET2_R, -FILLET2_R), FILLET2_R, 90, 90)
            Line((0, -FILLET2_R), (0, 0))
            Line((0, 0), (FILLET2_R, 0))
        make_face()
    fillet2_piece_19 = extrude(amount=38.63, mode=Mode.PRIVATE)
    fillet2_piece_19 = split(fillet2_piece_19, bisect_by=Plane(origin=(-20.12881047, 32.58, 9.425), z_dir=(0, 0, 1)), keep=Keep.TOP, mode=Mode.PRIVATE)
    fillet2_piece_19 = split(fillet2_piece_19, bisect_by=Plane(origin=(-20.12881047, 29.03, 9.819650702), z_dir=(0, 1, 0)), keep=Keep.TOP, mode=Mode.PRIVATE)
    add(fillet2_piece_19, mode=Mode.SUBTRACT)
    with BuildSketch(Plane(origin=(-20.375, 36.13, 10), x_dir=(1, 0, 0), z_dir=(0, -1, 0))) as fillet2_piece_20_section:
        with BuildLine():
            CenterArc((FILLET2_R, -FILLET2_R), FILLET2_R, 90, 90)
            Line((0, -FILLET2_R), (0, 0))
            Line((0, 0), (FILLET2_R, 0))
        make_face()
    fillet2_piece_20 = extrude(amount=38.63, mode=Mode.PRIVATE)
    fillet2_piece_20 = split(fillet2_piece_20, bisect_by=Plane(origin=(-20.361790059, 32.58, 9.425), z_dir=(0, 0, -1)), keep=Keep.TOP, mode=Mode.PRIVATE)
    fillet2_piece_20 = split(fillet2_piece_20, bisect_by=Plane(origin=(-20.361790059, 29.03, 9.277693036), z_dir=(0, 1, 0)), keep=Keep.TOP, mode=Mode.PRIVATE)
    add(fillet2_piece_20, mode=Mode.SUBTRACT)
    with BuildSketch(Plane(origin=(-20.375, 36.13, 10), x_dir=(1, 0, 0), z_dir=(0, -1, 0))) as fillet2_piece_21_section:
        with BuildLine():
            CenterArc((FILLET2_R, -FILLET2_R), FILLET2_R, 90, 90)
            Line((0, -FILLET2_R), (0, 0))
            Line((0, 0), (FILLET2_R, 0))
        make_face()
    fillet2_piece_21 = extrude(amount=38.63, mode=Mode.PRIVATE)
    fillet2_piece_21 = split(fillet2_piece_21, bisect_by=Plane(origin=(-20.12881047, 27.83, 9.425), z_dir=(0, 0, 1)), keep=Keep.TOP, mode=Mode.PRIVATE)
    fillet2_piece_21 = split(fillet2_piece_21, bisect_by=Plane(origin=(-20.12881047, 29.03, 9.819650702), z_dir=(0, -1, 0)), keep=Keep.TOP, mode=Mode.PRIVATE)
    fillet2_piece_21 = split(fillet2_piece_21, bisect_by=Plane(origin=(-20.12881047, 26.63, 9.819650702), z_dir=(0, 1, 0)), keep=Keep.TOP, mode=Mode.PRIVATE)
    add(fillet2_piece_21, mode=Mode.SUBTRACT)
    with BuildSketch(Plane(origin=(-20.375, 36.13, 10), x_dir=(1, 0, 0), z_dir=(0, -1, 0))) as fillet2_piece_22_section:
        with BuildLine():
            CenterArc((FILLET2_R, -FILLET2_R), FILLET2_R, 90, 90)
            Line((0, -FILLET2_R), (0, 0))
            Line((0, 0), (FILLET2_R, 0))
        make_face()
    fillet2_piece_22 = extrude(amount=38.63, mode=Mode.PRIVATE)
    fillet2_piece_22 = split(fillet2_piece_22, bisect_by=Plane(origin=(-20.12881047, 12.065, 9.425), z_dir=(0, 0, 1)), keep=Keep.TOP, mode=Mode.PRIVATE)
    fillet2_piece_22 = split(fillet2_piece_22, bisect_by=Plane(origin=(-20.12881047, 26.63, 9.819650702), z_dir=(0, -1, 0)), keep=Keep.TOP, mode=Mode.PRIVATE)
    add(fillet2_piece_22, mode=Mode.SUBTRACT)
    with BuildSketch(Plane(origin=(-20.375, 36.13, 10), x_dir=(1, 0, 0), z_dir=(0, -1, 0))) as fillet2_piece_23_section:
        with BuildLine():
            CenterArc((FILLET2_R, -FILLET2_R), FILLET2_R, 90, 90)
            Line((0, -FILLET2_R), (0, 0))
            Line((0, 0), (FILLET2_R, 0))
        make_face()
    fillet2_piece_23 = extrude(amount=38.63, mode=Mode.PRIVATE)
    fillet2_piece_23 = split(fillet2_piece_23, bisect_by=Plane(origin=(-20.361790059, 12.065, 9.425), z_dir=(0, 0, -1)), keep=Keep.TOP, mode=Mode.PRIVATE)
    fillet2_piece_23 = split(fillet2_piece_23, bisect_by=Plane(origin=(-20.361790059, 26.63, 9.277693036), z_dir=(0, -1, 0)), keep=Keep.TOP, mode=Mode.PRIVATE)
    add(fillet2_piece_23, mode=Mode.SUBTRACT)

    # Fillet3
    fillet3_edges = [part.edges().sort_by_distance(p)[0] for p in [
        (-10.375, 37.5, -6.4),
    ]]
    fillet(fillet3_edges, radius=FILLET3_R)


solid = part.part
